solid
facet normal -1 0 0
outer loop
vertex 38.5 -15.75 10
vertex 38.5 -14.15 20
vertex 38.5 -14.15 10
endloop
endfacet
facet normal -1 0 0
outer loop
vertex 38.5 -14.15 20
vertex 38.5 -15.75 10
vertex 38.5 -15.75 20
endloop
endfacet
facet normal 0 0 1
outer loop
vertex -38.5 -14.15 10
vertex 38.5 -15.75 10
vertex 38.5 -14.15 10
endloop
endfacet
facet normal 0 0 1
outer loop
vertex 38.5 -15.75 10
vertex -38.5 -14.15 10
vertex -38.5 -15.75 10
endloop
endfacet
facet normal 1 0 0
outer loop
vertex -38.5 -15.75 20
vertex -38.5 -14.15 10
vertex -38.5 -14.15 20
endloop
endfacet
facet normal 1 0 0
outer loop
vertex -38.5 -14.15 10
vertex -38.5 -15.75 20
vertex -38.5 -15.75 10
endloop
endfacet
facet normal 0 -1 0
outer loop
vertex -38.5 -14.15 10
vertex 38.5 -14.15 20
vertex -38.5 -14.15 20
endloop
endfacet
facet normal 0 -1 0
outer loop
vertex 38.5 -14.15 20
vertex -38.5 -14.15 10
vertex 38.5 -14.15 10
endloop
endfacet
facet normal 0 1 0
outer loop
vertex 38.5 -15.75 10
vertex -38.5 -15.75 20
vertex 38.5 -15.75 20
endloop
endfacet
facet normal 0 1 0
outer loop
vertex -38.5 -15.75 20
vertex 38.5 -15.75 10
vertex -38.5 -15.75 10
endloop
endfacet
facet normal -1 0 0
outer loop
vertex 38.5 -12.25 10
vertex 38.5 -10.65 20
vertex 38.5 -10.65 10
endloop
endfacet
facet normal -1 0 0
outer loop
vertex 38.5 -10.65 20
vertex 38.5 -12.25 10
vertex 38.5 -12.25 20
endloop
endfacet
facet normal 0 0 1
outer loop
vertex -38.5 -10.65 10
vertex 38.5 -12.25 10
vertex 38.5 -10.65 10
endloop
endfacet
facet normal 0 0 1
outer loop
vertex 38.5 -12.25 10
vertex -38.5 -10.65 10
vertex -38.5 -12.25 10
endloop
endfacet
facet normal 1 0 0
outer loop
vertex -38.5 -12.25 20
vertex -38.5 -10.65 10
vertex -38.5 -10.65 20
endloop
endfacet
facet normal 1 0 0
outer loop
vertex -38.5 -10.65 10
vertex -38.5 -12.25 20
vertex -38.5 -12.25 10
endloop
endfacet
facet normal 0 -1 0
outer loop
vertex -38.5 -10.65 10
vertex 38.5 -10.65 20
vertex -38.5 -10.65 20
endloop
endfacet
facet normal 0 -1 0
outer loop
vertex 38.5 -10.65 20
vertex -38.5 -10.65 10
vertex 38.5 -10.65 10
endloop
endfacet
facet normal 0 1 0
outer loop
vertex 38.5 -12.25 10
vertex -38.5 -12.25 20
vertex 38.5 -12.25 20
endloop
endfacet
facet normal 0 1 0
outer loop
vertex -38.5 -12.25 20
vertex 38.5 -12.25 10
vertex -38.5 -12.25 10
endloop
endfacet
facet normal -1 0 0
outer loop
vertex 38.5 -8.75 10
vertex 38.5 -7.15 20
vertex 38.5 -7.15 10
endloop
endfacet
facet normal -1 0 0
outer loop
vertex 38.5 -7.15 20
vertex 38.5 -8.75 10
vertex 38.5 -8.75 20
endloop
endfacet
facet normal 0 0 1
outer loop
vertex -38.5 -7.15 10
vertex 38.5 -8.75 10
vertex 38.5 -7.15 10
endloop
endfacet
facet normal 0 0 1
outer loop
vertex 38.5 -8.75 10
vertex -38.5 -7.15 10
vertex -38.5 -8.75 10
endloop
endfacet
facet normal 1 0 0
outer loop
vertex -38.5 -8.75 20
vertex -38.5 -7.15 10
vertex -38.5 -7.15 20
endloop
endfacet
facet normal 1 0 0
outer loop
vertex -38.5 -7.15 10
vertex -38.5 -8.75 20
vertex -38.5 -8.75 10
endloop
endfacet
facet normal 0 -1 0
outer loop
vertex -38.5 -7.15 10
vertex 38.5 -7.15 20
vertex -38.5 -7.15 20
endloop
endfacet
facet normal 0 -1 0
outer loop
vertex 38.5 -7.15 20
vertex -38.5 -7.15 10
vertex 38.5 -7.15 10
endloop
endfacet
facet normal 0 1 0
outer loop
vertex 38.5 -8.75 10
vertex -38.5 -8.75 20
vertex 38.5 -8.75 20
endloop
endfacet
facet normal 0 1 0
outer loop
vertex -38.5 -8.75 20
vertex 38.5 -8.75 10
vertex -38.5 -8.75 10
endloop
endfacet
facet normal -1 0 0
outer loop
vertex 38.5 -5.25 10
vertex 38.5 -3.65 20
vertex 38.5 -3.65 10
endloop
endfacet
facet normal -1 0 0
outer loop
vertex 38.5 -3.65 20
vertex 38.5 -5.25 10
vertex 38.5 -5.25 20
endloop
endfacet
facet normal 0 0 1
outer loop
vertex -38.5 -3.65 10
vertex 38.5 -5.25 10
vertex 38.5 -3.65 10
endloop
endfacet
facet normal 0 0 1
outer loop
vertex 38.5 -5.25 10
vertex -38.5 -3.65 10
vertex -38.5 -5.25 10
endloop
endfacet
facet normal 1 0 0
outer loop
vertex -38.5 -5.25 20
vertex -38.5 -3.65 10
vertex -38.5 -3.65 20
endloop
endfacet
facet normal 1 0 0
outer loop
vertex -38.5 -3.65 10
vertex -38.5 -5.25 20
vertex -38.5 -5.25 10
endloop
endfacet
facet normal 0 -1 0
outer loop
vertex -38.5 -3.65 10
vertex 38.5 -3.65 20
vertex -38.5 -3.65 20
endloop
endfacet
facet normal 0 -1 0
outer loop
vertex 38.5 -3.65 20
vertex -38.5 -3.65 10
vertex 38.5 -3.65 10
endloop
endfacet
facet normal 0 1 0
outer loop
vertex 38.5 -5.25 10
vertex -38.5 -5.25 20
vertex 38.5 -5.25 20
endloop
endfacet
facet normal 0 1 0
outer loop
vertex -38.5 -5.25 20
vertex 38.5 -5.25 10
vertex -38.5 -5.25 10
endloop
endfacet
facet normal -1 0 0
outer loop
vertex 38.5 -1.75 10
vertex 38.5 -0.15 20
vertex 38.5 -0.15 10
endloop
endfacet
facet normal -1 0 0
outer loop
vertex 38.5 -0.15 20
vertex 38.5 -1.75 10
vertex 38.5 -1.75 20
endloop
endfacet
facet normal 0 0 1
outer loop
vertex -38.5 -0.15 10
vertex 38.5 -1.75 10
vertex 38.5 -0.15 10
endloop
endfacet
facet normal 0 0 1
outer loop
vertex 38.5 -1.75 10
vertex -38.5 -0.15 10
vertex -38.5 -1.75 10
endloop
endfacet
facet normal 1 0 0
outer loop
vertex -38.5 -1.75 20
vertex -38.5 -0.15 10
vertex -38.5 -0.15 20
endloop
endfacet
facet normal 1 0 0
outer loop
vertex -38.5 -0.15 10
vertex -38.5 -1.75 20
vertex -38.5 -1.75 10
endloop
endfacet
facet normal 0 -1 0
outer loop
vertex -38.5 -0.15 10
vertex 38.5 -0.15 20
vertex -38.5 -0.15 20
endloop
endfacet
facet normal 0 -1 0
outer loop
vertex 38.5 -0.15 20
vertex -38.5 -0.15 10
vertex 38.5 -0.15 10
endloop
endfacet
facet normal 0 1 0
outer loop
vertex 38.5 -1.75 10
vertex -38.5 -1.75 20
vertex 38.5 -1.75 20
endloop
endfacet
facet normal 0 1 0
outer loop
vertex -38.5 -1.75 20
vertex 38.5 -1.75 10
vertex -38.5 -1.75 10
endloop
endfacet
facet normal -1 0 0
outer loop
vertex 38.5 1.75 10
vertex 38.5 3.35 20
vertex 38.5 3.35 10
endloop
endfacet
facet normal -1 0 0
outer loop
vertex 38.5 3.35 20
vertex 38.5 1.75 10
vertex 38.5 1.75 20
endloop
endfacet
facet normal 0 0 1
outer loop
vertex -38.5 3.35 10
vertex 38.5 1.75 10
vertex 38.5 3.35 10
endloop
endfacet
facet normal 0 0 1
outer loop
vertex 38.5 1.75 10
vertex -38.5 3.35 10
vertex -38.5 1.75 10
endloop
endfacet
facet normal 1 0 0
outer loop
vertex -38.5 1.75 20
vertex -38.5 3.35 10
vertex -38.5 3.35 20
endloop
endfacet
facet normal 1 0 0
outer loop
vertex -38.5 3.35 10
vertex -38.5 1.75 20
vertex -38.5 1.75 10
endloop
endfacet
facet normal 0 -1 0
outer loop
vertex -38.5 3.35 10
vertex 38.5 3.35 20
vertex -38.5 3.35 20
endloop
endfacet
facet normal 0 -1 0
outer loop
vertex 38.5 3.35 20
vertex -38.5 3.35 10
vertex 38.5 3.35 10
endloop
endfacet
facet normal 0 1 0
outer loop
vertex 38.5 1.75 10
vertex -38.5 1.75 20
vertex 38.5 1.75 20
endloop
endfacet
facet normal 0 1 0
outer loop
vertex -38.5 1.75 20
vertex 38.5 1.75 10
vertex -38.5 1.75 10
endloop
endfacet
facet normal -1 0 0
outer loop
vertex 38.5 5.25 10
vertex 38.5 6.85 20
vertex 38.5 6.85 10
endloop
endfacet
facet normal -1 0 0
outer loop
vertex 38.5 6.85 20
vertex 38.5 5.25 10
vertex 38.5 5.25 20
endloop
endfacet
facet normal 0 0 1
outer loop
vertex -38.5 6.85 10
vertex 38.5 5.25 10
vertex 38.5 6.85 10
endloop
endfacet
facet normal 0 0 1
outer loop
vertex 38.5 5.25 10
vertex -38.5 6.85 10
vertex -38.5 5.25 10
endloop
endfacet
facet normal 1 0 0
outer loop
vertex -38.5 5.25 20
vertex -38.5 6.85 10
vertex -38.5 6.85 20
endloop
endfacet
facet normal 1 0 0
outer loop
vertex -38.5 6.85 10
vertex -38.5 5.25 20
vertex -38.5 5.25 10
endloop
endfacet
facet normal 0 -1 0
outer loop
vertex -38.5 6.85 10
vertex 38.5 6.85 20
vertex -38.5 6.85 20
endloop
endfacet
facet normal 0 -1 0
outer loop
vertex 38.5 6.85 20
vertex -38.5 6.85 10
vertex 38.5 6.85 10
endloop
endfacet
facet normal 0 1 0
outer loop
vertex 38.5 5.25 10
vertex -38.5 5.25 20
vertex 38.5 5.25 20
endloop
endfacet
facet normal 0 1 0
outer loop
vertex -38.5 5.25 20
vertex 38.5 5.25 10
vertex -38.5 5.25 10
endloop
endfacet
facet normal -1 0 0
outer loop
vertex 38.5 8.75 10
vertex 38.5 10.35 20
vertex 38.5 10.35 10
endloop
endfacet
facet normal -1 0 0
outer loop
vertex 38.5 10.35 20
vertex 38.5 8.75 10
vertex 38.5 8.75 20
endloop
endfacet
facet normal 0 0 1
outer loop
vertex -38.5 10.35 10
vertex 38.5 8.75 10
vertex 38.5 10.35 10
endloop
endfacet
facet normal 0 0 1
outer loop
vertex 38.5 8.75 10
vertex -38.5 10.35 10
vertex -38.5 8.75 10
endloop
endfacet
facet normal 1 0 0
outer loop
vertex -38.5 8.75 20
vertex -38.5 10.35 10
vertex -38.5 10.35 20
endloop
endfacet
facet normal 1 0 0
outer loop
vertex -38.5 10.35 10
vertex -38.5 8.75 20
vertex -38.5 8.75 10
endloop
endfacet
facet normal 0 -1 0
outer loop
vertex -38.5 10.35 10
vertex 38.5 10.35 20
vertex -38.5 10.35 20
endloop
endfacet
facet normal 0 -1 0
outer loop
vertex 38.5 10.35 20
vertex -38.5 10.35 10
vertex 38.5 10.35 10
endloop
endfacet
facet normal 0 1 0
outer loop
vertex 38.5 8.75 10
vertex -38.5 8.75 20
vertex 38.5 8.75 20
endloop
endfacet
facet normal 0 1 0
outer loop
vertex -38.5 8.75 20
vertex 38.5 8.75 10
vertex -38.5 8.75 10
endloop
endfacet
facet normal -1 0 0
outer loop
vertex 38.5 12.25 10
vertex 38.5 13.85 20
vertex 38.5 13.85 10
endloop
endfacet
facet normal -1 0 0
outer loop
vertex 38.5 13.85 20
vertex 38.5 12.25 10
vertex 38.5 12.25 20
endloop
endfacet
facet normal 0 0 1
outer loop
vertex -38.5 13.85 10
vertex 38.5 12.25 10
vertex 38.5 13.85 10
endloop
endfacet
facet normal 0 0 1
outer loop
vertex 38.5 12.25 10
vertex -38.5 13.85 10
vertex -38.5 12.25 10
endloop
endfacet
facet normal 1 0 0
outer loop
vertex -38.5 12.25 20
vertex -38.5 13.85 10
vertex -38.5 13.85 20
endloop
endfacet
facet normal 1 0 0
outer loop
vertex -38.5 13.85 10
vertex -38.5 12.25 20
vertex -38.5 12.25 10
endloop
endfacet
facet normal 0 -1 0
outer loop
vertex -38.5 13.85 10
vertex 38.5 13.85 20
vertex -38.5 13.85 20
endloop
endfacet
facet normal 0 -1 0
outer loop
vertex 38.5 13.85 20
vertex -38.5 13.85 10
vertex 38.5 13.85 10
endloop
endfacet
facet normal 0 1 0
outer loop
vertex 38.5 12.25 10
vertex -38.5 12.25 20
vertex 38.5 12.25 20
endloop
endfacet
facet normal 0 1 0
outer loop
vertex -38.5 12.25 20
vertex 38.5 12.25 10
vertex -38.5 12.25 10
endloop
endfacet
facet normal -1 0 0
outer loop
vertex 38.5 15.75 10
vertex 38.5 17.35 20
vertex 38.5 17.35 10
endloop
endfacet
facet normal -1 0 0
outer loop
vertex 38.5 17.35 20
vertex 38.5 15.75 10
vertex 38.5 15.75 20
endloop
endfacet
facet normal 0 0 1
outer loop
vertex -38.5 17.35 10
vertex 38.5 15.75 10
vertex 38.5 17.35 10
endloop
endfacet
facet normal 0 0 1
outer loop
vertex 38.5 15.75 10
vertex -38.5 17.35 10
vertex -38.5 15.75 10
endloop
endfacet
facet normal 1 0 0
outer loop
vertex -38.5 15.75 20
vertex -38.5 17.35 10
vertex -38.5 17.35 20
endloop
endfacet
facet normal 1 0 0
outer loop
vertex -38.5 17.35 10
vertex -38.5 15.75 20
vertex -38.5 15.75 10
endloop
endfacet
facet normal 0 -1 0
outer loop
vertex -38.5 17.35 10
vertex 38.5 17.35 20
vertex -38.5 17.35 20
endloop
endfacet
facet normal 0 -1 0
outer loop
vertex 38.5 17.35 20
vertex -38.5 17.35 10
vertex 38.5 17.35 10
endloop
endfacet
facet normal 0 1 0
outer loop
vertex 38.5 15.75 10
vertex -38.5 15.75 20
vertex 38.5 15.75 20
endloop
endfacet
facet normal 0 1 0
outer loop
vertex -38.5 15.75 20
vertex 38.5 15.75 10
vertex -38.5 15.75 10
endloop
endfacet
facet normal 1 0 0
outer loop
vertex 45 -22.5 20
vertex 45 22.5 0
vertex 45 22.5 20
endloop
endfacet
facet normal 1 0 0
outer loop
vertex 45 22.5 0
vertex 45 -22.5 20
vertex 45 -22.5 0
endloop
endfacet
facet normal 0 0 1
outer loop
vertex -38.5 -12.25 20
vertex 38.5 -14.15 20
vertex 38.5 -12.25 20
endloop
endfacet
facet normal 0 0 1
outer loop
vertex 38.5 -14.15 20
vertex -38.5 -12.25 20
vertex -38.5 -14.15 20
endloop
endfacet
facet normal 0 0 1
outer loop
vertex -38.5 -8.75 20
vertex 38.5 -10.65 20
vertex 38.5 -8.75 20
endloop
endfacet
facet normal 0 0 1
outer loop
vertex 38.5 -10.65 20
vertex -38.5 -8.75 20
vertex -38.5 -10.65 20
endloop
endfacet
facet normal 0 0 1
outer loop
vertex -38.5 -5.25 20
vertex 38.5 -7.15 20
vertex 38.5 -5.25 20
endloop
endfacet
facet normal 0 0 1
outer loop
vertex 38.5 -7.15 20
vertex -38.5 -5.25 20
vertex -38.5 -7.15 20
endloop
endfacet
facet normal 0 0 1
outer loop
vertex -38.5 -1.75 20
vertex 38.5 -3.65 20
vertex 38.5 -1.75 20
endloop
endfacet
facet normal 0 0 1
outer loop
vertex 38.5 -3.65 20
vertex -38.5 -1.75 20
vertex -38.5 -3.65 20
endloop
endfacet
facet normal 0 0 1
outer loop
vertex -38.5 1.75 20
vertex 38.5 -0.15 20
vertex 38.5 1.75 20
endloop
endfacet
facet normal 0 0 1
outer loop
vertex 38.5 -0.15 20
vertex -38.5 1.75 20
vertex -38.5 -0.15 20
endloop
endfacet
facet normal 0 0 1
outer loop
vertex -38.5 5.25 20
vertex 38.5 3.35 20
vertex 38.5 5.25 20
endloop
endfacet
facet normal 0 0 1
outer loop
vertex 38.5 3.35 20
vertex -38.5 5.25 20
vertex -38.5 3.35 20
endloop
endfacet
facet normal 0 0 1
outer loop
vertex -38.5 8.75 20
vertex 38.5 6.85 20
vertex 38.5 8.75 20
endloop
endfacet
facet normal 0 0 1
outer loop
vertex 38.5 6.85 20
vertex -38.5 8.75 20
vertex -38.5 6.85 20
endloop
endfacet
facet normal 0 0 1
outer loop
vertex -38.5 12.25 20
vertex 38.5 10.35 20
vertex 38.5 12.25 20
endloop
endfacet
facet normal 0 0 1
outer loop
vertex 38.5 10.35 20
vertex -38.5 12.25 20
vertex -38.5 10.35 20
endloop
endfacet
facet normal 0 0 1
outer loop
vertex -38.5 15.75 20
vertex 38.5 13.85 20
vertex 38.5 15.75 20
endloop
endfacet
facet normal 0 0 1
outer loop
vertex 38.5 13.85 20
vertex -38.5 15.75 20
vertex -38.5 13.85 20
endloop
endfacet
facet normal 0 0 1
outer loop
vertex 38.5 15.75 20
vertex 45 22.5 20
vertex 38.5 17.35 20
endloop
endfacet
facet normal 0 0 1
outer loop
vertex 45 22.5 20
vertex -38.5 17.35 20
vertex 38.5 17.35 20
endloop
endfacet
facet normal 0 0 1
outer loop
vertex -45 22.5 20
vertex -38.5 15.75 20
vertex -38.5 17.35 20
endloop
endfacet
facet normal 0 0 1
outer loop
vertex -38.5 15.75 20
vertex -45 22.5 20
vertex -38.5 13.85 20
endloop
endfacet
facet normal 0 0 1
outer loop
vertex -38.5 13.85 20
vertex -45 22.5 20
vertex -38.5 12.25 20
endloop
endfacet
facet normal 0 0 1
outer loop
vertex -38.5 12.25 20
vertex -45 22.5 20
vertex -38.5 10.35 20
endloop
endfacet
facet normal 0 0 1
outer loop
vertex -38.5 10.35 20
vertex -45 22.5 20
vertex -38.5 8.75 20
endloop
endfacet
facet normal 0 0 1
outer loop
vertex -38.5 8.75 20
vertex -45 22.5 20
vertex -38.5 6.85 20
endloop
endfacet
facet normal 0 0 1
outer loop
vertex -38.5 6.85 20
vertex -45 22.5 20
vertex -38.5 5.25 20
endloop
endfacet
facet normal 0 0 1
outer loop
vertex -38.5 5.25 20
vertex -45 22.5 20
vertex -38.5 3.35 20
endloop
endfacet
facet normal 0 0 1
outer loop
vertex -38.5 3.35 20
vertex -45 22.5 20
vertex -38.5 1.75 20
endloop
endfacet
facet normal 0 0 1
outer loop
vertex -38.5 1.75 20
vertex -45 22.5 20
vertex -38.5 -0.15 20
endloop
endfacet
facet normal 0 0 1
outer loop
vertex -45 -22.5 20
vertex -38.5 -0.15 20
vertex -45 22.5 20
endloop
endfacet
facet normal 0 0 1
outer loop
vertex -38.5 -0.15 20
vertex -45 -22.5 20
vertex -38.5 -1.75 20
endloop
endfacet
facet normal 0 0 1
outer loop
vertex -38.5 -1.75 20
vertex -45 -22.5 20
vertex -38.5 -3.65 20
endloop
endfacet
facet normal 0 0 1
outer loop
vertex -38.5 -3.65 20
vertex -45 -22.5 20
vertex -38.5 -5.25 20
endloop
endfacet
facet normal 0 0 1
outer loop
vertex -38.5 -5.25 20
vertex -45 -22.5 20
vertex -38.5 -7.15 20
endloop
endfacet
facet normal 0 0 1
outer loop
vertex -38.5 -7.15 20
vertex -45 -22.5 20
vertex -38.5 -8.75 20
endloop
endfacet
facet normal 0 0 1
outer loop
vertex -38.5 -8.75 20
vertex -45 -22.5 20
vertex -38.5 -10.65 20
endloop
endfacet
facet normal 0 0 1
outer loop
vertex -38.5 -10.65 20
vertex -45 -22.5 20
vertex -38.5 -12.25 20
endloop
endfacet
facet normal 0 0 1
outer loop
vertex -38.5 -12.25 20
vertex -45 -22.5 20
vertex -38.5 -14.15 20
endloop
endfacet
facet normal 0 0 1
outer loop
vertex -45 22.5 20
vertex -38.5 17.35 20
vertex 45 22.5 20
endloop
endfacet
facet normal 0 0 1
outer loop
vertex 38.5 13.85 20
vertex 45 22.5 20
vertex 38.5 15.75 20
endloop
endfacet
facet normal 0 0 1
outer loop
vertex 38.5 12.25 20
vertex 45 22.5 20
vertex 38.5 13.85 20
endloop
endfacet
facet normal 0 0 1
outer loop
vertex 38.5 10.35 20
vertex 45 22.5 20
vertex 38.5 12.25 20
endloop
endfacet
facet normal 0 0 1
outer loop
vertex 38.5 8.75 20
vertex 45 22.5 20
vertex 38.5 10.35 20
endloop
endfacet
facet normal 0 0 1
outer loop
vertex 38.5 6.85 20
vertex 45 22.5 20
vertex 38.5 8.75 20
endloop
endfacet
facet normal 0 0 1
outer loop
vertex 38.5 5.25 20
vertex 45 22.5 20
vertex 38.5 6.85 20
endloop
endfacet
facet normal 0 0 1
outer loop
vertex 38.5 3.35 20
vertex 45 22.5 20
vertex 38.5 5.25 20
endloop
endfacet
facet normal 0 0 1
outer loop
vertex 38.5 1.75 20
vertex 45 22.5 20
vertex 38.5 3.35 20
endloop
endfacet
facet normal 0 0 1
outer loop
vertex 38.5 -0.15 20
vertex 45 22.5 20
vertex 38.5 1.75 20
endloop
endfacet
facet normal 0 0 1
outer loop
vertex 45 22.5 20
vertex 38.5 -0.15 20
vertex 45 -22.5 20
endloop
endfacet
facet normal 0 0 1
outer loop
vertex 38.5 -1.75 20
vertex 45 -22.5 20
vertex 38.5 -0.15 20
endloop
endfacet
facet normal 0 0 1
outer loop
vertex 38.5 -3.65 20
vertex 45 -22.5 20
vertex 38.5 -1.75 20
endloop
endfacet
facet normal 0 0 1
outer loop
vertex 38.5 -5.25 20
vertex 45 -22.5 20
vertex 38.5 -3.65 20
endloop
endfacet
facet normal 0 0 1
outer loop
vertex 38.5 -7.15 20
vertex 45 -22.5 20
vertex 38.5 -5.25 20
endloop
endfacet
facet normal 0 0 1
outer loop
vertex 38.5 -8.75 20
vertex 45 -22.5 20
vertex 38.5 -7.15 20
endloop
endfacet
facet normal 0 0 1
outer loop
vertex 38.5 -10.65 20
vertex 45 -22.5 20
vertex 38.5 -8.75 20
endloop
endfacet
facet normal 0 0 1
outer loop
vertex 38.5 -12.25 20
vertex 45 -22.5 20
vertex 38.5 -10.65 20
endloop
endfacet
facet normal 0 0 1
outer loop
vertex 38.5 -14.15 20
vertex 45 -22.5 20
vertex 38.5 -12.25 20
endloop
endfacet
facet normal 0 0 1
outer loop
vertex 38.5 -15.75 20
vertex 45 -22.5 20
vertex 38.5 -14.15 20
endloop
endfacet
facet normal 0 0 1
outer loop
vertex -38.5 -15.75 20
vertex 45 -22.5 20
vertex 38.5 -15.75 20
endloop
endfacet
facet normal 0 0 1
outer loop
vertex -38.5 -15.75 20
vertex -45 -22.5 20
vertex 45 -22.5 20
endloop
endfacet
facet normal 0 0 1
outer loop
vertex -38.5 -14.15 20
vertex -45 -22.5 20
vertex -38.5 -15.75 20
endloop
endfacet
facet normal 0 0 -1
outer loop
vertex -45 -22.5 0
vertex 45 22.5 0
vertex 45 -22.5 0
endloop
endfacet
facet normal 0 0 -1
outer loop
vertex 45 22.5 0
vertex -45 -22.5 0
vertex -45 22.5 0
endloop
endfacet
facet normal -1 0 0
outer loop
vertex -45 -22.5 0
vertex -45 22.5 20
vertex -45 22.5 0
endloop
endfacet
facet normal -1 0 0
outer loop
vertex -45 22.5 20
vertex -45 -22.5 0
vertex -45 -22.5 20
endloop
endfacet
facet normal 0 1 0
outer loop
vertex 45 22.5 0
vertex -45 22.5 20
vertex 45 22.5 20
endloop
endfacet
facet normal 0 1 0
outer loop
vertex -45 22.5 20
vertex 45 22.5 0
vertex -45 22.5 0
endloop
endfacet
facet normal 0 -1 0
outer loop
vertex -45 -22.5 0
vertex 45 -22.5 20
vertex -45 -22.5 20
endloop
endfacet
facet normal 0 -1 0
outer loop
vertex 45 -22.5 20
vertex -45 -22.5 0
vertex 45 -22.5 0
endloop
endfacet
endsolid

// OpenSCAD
// Microscope slide drying rack
// Units: mm

// ---- Block ----
block_l = 90;      // block length (X)
block_w = 45;      // block width (Y)
block_h = 20;      // block height (Z)

// ---- Slots ----
slot_n     = 10;   // number of slots
slot_len   = 77;   // slot length along X
slot_w     = 1.6;  // slot width along Y
slot_d     = 10;   // slot depth from top face
slot_pitch = 3.5;  // centre-to-centre spacing along Y

// ---- Cut clearance ----
eps = 0.5;         // overshoot past top face

$fn = 64;

difference() {
    // Base block, centred in X/Y, resting on z = 0
    translate([-block_l/2, -block_w/2, 0])
        cube([block_l, block_w, block_h]);

    // Row of parallel slots, centred on the block
    for (i = [0 : slot_n - 1]) {
        y = (i - (slot_n - 1)/2) * slot_pitch;
        translate([-slot_len/2, y, block_h - slot_d])
            cube([slot_len, slot_w, slot_d + eps]);
    }
}
